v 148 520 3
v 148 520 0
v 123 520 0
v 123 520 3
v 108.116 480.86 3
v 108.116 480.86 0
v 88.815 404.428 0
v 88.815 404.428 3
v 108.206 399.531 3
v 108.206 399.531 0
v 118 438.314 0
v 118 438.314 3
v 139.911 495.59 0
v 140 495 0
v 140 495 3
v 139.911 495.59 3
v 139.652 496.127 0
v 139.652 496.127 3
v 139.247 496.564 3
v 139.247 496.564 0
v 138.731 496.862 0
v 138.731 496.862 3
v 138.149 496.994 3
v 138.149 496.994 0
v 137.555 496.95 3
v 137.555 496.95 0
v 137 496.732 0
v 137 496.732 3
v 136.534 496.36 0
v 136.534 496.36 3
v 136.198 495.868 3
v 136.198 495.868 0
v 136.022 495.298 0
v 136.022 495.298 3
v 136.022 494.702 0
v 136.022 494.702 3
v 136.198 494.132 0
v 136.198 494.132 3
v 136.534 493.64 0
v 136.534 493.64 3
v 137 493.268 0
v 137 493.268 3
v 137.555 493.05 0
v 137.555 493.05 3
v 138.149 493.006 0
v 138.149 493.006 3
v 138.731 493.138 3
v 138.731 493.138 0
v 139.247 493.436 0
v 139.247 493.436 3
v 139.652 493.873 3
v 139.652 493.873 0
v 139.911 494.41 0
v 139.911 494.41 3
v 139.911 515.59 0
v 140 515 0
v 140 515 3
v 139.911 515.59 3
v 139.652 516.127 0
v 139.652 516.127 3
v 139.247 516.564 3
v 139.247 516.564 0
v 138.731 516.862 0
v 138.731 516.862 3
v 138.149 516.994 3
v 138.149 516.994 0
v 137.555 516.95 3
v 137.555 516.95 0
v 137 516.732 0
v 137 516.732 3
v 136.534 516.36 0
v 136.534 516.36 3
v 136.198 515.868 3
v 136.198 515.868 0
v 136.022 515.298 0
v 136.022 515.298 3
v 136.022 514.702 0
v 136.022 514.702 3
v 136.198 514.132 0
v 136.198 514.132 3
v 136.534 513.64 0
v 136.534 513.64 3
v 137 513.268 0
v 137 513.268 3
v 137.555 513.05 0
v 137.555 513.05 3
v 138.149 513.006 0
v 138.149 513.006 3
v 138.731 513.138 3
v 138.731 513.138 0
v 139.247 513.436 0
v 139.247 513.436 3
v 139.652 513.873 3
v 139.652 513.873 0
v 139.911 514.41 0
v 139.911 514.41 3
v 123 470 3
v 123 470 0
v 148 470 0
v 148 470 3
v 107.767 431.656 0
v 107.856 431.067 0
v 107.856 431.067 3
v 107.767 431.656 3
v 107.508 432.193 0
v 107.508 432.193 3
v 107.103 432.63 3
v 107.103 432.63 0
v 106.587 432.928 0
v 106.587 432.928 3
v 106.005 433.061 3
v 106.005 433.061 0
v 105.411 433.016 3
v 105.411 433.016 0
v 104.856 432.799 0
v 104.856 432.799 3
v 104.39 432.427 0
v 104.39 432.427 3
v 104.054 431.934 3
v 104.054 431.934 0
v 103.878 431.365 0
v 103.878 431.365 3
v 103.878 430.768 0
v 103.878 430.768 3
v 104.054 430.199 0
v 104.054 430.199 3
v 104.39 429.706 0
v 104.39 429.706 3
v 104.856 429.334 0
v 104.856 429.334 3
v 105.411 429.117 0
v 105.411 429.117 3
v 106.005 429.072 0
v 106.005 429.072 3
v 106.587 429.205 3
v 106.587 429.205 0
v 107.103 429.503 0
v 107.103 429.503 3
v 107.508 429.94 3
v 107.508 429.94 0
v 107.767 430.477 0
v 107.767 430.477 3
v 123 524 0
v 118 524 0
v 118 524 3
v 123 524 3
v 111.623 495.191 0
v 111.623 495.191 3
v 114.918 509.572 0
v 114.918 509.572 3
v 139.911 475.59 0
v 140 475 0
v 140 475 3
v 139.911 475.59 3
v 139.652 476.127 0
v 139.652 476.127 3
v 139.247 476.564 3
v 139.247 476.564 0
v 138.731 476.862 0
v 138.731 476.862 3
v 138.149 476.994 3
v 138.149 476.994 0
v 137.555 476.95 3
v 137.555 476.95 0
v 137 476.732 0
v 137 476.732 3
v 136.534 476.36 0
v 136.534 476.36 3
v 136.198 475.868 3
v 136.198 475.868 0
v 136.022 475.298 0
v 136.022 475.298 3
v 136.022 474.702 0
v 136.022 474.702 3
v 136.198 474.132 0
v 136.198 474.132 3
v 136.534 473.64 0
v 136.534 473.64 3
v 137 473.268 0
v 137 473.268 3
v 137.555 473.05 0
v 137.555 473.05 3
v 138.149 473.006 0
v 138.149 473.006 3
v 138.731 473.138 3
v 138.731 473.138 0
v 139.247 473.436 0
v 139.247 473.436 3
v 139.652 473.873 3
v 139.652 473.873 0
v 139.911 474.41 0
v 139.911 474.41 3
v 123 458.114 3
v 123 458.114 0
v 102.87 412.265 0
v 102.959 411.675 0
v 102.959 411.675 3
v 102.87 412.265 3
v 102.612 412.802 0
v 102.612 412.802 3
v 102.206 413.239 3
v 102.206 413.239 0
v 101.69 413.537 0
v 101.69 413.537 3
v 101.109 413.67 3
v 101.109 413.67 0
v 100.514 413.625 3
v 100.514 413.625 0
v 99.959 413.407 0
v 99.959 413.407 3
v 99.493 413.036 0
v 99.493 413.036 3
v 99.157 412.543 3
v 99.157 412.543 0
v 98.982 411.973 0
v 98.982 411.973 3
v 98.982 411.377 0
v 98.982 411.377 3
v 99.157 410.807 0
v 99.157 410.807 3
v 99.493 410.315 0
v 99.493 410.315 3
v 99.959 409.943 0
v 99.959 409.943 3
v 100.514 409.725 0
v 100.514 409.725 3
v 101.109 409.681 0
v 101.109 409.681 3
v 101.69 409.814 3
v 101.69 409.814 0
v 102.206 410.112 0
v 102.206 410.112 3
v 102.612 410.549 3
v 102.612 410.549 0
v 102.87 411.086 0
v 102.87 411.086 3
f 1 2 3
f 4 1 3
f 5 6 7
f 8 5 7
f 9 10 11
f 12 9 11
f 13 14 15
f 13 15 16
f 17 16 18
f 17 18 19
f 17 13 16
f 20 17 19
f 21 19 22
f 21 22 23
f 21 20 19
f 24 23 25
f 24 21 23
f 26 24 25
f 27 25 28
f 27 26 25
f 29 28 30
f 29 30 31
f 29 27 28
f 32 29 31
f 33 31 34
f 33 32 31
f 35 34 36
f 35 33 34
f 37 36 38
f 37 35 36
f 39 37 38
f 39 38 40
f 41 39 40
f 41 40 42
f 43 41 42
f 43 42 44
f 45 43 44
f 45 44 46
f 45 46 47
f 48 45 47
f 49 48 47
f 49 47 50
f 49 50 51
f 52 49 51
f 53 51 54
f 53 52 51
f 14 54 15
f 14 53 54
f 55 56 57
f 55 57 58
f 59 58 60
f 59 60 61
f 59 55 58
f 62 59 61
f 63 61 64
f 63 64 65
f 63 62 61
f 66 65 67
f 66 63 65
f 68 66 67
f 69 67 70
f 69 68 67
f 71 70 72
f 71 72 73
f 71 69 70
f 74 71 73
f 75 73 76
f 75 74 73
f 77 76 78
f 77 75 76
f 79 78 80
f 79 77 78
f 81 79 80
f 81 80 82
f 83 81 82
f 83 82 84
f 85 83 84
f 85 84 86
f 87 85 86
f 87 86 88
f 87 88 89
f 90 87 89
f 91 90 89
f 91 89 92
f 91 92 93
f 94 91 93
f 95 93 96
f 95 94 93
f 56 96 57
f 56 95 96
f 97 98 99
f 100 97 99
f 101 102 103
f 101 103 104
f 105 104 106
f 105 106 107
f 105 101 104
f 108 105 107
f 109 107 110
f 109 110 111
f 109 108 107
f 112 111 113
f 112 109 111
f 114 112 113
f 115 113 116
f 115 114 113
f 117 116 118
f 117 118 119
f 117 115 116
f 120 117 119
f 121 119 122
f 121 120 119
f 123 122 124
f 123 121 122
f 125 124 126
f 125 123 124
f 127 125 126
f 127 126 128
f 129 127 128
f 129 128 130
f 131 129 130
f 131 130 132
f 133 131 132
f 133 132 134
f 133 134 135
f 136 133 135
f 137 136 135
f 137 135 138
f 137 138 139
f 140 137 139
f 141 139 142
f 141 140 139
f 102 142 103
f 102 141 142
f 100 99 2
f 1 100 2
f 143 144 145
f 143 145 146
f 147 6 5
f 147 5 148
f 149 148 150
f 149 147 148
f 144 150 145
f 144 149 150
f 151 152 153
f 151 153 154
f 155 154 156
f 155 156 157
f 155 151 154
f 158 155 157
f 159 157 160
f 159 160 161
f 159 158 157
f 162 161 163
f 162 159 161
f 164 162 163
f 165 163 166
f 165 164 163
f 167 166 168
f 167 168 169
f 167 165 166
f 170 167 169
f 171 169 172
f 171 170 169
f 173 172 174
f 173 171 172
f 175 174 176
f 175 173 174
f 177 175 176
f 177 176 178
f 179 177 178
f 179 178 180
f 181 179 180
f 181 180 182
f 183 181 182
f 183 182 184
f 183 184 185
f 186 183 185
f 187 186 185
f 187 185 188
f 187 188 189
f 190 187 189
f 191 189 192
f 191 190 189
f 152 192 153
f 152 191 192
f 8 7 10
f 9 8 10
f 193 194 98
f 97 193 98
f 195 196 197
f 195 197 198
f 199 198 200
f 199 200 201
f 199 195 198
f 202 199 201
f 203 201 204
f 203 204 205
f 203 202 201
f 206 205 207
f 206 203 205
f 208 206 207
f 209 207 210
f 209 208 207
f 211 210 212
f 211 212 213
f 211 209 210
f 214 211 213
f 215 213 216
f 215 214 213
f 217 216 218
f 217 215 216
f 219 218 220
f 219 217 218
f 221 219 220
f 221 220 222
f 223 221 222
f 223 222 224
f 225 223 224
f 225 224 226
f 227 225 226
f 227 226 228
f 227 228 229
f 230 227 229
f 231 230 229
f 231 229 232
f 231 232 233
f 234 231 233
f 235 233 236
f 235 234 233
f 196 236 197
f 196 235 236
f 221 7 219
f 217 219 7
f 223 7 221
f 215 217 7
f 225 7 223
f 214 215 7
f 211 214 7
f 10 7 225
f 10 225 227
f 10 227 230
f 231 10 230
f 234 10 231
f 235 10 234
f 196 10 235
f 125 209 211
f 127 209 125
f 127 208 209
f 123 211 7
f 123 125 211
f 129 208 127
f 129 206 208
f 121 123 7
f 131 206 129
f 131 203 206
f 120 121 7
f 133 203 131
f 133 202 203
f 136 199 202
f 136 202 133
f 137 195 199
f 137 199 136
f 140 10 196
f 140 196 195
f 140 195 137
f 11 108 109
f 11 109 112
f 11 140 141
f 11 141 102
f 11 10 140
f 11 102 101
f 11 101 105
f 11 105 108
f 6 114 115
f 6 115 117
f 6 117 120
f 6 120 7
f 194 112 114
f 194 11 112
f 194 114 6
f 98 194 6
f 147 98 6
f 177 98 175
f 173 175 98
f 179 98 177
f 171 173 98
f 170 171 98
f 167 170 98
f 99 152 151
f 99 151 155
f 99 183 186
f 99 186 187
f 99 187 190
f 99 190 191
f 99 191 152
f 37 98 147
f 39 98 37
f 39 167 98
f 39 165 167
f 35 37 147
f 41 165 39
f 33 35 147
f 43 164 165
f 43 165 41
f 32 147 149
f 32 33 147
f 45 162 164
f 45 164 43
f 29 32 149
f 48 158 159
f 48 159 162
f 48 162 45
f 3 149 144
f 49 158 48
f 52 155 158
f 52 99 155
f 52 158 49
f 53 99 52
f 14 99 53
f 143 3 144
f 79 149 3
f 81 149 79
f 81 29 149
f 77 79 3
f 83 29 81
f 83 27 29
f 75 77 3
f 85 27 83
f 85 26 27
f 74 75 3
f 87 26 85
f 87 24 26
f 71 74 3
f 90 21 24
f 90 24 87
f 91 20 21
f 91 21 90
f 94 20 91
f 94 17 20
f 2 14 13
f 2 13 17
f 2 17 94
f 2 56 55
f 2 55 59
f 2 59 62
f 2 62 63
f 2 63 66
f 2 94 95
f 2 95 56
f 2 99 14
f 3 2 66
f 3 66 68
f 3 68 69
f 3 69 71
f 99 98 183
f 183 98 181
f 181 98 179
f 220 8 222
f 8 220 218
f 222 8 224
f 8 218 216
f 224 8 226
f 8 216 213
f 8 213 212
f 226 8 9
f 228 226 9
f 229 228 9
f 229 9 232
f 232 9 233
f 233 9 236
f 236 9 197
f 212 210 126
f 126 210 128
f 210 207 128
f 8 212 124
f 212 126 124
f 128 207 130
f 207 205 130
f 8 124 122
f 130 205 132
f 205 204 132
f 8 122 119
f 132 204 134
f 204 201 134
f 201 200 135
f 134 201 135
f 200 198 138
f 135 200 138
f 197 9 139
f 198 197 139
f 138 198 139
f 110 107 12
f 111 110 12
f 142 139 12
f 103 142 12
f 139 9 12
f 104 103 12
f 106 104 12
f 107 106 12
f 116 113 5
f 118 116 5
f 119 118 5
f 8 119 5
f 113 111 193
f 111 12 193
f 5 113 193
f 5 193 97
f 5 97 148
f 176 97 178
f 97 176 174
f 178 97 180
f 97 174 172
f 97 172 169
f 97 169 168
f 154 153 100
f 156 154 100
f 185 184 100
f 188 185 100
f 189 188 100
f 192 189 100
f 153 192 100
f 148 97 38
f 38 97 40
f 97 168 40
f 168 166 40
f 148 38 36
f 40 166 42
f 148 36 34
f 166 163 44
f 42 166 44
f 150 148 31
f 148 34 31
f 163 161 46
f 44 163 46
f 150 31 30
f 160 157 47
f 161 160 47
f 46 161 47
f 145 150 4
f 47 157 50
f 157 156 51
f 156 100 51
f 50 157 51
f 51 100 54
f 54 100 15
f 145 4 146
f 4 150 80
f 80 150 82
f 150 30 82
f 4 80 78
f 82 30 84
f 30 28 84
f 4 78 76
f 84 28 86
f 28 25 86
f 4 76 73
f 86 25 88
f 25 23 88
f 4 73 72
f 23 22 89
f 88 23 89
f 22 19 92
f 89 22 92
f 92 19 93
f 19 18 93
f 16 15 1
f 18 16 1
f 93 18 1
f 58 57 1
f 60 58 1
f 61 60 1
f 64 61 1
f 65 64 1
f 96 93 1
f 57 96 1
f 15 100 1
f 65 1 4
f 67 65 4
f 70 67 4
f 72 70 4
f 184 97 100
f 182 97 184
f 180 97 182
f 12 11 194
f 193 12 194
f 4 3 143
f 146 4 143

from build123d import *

# Parameters (mm, degrees)
SKETCH_1_R      = 2
SKETCH_1_W      = 5
SKETCH_1_H      = 4
EXTRUDE_1_DEPTH = 3
FILLET_3_R      = 1000


with BuildPart() as part:
    # 草图1 → 凸台-拉伸1 (new body)
    # profile 1 of 2: a face of its own
    with BuildSketch(Plane.XY):
        Polygon((124.141229584, 470), (125, 470), (148, 470), (148, 520), (123, 520), (118, 520), (88.81515415, 404.428010432), (108.206427567, 399.531224216), (118, 438.31377105), (123, 458.11377105), (123, 470), align=None)
        with Locations((100.959183966, 411.675254033)):
            Circle(SKETCH_1_R, mode=Mode.SUBTRACT)
        with Locations((105.855970183, 431.06652745)):
            Circle(SKETCH_1_R, mode=Mode.SUBTRACT)
        with Locations((138, 475)):
            Circle(SKETCH_1_R, mode=Mode.SUBTRACT)
        with Locations((138, 495)):
            Circle(SKETCH_1_R, mode=Mode.SUBTRACT)
        with Locations((138, 515)):
            Circle(SKETCH_1_R, mode=Mode.SUBTRACT)
    # profile 2 of 2: a face of its own
    with BuildSketch(Plane.XY):
        with Locations((120.5, 522)):
            Rectangle(SKETCH_1_W, SKETCH_1_H)
    extrude(amount=EXTRUDE_1_DEPTH)

    # 圆角3
    # the kernel refuses this fillet: 1000 mm, written as the material it adds along each edge
    with BuildSketch(Plane(origin=(118, 520, 0), x_dir=(-0.24483931082618016, -0.9695636708716768, 0), z_dir=(0, 0, 1))) as fillet_3_piece_1:
        with BuildLine():
            CenterArc((40.368274514, -1000), FILLET_3_R, 90, 2.535967308)
            Line((-3.878254683, -0.979357243), (0, 0))
            Line((0, 0), (40.368274514, 0))
        make_face()
    extrude(amount=3)


solid = part.part
